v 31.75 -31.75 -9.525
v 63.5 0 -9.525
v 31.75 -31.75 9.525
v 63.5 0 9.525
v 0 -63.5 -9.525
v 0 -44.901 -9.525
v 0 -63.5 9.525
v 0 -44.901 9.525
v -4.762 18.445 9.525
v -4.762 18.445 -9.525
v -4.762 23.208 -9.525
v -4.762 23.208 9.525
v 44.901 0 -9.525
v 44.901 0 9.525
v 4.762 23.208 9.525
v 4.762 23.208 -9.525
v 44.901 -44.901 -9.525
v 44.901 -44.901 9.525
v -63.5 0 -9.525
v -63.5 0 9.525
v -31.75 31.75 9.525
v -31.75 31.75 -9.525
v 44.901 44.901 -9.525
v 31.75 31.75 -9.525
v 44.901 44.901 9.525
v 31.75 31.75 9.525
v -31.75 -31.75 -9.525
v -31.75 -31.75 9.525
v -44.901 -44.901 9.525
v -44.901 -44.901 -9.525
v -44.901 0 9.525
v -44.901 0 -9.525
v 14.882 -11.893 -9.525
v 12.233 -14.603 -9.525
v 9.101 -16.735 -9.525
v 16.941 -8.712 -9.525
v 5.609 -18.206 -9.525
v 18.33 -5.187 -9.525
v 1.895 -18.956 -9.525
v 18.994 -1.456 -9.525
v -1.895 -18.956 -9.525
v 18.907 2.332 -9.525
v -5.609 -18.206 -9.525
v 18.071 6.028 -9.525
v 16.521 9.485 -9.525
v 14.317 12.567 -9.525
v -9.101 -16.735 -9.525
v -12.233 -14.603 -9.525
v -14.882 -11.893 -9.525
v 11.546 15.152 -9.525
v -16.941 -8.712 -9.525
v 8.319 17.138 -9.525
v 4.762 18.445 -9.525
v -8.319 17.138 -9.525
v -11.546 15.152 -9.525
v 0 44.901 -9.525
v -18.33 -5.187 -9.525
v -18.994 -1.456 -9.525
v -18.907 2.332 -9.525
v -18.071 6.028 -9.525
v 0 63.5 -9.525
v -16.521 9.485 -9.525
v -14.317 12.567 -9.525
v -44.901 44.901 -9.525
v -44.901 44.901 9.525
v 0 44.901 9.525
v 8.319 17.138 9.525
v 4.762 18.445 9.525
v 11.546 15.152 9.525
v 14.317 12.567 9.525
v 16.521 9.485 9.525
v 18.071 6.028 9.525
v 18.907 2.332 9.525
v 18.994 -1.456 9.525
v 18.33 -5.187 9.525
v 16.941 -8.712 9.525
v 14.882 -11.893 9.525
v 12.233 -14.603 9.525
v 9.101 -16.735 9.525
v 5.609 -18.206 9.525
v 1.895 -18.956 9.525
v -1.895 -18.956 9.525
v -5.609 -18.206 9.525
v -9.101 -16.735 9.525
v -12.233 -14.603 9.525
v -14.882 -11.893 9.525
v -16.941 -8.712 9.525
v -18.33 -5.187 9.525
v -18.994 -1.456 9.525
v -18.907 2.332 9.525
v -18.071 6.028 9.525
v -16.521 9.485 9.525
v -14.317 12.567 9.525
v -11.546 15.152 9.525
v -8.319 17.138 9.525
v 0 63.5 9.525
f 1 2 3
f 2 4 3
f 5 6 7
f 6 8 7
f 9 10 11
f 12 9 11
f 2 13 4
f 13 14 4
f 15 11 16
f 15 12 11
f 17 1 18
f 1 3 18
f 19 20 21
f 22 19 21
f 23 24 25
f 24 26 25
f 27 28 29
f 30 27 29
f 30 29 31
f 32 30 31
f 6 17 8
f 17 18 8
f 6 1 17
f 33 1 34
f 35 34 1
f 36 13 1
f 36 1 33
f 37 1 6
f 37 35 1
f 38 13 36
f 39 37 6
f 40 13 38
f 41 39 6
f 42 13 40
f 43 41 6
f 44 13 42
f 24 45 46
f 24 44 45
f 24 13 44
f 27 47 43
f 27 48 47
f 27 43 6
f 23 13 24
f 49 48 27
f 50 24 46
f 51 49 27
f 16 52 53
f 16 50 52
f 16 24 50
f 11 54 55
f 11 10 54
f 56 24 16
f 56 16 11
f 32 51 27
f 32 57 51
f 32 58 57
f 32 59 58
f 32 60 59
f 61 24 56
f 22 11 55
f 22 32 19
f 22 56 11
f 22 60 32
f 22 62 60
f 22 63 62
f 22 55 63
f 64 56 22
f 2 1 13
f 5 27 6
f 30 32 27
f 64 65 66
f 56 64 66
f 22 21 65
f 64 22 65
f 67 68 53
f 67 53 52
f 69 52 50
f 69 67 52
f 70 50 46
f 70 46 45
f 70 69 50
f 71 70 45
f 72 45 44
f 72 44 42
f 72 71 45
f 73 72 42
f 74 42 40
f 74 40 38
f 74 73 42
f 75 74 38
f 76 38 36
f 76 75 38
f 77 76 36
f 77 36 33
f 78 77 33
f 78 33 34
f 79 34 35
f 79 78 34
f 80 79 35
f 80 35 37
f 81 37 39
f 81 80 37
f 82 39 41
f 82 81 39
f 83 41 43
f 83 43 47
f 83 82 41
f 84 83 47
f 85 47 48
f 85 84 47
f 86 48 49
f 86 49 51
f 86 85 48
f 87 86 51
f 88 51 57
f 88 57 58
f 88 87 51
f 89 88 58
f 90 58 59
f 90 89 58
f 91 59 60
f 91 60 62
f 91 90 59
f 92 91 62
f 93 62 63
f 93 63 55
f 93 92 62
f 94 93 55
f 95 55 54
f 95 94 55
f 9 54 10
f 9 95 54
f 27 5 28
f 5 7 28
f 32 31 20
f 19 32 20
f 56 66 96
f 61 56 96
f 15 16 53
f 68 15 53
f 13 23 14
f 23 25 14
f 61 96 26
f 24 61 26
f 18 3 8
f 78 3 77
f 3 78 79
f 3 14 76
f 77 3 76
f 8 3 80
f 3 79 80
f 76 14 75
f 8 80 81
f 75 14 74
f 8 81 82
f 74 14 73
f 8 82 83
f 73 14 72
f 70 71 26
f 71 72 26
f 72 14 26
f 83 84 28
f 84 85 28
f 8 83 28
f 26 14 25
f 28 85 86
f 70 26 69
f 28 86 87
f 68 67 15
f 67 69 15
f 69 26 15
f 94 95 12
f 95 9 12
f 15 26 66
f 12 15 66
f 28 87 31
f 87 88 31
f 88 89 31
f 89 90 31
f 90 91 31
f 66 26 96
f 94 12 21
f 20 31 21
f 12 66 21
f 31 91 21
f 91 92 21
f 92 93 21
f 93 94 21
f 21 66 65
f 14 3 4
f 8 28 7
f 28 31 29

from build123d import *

# Parameters (mm, degrees)
BOSS_EXTRUDE1_DEPTH = 9.525


with BuildPart() as part:
    # Sketch1 → Boss-Extrude1 (new, symmetric)
    with BuildSketch(Plane.XY):
        Polygon((0, 63.5), (31.75, 31.75), (44.901280605, 44.901280605), (44.901280605, 0), (63.5, 0), (31.75, -31.75), (44.901280605, -44.901280605), (0, -44.901280605), (0, -63.5), (-31.75, -31.75), (-44.901280605, -44.901280605), (-44.901280605, 0), (-63.5, 0), (-31.75, 31.75), (-44.901280605, 44.901280605), (0, 44.901280605), align=None)
        with BuildLine():
            Line((-4.7625, 23.207583186), (4.7625, 23.207583186))
            Line((4.7625, 23.207583186), (4.7625, 18.445083186))
            ThreePointArc((4.7625, 18.445083186), (0, -19.05), (-4.7625, 18.445083186))
            Line((-4.7625, 18.445083186), (-4.7625, 23.207583186))
        make_face(mode=Mode.SUBTRACT)
    extrude(amount=BOSS_EXTRUDE1_DEPTH, both=True)


solid = part.part
